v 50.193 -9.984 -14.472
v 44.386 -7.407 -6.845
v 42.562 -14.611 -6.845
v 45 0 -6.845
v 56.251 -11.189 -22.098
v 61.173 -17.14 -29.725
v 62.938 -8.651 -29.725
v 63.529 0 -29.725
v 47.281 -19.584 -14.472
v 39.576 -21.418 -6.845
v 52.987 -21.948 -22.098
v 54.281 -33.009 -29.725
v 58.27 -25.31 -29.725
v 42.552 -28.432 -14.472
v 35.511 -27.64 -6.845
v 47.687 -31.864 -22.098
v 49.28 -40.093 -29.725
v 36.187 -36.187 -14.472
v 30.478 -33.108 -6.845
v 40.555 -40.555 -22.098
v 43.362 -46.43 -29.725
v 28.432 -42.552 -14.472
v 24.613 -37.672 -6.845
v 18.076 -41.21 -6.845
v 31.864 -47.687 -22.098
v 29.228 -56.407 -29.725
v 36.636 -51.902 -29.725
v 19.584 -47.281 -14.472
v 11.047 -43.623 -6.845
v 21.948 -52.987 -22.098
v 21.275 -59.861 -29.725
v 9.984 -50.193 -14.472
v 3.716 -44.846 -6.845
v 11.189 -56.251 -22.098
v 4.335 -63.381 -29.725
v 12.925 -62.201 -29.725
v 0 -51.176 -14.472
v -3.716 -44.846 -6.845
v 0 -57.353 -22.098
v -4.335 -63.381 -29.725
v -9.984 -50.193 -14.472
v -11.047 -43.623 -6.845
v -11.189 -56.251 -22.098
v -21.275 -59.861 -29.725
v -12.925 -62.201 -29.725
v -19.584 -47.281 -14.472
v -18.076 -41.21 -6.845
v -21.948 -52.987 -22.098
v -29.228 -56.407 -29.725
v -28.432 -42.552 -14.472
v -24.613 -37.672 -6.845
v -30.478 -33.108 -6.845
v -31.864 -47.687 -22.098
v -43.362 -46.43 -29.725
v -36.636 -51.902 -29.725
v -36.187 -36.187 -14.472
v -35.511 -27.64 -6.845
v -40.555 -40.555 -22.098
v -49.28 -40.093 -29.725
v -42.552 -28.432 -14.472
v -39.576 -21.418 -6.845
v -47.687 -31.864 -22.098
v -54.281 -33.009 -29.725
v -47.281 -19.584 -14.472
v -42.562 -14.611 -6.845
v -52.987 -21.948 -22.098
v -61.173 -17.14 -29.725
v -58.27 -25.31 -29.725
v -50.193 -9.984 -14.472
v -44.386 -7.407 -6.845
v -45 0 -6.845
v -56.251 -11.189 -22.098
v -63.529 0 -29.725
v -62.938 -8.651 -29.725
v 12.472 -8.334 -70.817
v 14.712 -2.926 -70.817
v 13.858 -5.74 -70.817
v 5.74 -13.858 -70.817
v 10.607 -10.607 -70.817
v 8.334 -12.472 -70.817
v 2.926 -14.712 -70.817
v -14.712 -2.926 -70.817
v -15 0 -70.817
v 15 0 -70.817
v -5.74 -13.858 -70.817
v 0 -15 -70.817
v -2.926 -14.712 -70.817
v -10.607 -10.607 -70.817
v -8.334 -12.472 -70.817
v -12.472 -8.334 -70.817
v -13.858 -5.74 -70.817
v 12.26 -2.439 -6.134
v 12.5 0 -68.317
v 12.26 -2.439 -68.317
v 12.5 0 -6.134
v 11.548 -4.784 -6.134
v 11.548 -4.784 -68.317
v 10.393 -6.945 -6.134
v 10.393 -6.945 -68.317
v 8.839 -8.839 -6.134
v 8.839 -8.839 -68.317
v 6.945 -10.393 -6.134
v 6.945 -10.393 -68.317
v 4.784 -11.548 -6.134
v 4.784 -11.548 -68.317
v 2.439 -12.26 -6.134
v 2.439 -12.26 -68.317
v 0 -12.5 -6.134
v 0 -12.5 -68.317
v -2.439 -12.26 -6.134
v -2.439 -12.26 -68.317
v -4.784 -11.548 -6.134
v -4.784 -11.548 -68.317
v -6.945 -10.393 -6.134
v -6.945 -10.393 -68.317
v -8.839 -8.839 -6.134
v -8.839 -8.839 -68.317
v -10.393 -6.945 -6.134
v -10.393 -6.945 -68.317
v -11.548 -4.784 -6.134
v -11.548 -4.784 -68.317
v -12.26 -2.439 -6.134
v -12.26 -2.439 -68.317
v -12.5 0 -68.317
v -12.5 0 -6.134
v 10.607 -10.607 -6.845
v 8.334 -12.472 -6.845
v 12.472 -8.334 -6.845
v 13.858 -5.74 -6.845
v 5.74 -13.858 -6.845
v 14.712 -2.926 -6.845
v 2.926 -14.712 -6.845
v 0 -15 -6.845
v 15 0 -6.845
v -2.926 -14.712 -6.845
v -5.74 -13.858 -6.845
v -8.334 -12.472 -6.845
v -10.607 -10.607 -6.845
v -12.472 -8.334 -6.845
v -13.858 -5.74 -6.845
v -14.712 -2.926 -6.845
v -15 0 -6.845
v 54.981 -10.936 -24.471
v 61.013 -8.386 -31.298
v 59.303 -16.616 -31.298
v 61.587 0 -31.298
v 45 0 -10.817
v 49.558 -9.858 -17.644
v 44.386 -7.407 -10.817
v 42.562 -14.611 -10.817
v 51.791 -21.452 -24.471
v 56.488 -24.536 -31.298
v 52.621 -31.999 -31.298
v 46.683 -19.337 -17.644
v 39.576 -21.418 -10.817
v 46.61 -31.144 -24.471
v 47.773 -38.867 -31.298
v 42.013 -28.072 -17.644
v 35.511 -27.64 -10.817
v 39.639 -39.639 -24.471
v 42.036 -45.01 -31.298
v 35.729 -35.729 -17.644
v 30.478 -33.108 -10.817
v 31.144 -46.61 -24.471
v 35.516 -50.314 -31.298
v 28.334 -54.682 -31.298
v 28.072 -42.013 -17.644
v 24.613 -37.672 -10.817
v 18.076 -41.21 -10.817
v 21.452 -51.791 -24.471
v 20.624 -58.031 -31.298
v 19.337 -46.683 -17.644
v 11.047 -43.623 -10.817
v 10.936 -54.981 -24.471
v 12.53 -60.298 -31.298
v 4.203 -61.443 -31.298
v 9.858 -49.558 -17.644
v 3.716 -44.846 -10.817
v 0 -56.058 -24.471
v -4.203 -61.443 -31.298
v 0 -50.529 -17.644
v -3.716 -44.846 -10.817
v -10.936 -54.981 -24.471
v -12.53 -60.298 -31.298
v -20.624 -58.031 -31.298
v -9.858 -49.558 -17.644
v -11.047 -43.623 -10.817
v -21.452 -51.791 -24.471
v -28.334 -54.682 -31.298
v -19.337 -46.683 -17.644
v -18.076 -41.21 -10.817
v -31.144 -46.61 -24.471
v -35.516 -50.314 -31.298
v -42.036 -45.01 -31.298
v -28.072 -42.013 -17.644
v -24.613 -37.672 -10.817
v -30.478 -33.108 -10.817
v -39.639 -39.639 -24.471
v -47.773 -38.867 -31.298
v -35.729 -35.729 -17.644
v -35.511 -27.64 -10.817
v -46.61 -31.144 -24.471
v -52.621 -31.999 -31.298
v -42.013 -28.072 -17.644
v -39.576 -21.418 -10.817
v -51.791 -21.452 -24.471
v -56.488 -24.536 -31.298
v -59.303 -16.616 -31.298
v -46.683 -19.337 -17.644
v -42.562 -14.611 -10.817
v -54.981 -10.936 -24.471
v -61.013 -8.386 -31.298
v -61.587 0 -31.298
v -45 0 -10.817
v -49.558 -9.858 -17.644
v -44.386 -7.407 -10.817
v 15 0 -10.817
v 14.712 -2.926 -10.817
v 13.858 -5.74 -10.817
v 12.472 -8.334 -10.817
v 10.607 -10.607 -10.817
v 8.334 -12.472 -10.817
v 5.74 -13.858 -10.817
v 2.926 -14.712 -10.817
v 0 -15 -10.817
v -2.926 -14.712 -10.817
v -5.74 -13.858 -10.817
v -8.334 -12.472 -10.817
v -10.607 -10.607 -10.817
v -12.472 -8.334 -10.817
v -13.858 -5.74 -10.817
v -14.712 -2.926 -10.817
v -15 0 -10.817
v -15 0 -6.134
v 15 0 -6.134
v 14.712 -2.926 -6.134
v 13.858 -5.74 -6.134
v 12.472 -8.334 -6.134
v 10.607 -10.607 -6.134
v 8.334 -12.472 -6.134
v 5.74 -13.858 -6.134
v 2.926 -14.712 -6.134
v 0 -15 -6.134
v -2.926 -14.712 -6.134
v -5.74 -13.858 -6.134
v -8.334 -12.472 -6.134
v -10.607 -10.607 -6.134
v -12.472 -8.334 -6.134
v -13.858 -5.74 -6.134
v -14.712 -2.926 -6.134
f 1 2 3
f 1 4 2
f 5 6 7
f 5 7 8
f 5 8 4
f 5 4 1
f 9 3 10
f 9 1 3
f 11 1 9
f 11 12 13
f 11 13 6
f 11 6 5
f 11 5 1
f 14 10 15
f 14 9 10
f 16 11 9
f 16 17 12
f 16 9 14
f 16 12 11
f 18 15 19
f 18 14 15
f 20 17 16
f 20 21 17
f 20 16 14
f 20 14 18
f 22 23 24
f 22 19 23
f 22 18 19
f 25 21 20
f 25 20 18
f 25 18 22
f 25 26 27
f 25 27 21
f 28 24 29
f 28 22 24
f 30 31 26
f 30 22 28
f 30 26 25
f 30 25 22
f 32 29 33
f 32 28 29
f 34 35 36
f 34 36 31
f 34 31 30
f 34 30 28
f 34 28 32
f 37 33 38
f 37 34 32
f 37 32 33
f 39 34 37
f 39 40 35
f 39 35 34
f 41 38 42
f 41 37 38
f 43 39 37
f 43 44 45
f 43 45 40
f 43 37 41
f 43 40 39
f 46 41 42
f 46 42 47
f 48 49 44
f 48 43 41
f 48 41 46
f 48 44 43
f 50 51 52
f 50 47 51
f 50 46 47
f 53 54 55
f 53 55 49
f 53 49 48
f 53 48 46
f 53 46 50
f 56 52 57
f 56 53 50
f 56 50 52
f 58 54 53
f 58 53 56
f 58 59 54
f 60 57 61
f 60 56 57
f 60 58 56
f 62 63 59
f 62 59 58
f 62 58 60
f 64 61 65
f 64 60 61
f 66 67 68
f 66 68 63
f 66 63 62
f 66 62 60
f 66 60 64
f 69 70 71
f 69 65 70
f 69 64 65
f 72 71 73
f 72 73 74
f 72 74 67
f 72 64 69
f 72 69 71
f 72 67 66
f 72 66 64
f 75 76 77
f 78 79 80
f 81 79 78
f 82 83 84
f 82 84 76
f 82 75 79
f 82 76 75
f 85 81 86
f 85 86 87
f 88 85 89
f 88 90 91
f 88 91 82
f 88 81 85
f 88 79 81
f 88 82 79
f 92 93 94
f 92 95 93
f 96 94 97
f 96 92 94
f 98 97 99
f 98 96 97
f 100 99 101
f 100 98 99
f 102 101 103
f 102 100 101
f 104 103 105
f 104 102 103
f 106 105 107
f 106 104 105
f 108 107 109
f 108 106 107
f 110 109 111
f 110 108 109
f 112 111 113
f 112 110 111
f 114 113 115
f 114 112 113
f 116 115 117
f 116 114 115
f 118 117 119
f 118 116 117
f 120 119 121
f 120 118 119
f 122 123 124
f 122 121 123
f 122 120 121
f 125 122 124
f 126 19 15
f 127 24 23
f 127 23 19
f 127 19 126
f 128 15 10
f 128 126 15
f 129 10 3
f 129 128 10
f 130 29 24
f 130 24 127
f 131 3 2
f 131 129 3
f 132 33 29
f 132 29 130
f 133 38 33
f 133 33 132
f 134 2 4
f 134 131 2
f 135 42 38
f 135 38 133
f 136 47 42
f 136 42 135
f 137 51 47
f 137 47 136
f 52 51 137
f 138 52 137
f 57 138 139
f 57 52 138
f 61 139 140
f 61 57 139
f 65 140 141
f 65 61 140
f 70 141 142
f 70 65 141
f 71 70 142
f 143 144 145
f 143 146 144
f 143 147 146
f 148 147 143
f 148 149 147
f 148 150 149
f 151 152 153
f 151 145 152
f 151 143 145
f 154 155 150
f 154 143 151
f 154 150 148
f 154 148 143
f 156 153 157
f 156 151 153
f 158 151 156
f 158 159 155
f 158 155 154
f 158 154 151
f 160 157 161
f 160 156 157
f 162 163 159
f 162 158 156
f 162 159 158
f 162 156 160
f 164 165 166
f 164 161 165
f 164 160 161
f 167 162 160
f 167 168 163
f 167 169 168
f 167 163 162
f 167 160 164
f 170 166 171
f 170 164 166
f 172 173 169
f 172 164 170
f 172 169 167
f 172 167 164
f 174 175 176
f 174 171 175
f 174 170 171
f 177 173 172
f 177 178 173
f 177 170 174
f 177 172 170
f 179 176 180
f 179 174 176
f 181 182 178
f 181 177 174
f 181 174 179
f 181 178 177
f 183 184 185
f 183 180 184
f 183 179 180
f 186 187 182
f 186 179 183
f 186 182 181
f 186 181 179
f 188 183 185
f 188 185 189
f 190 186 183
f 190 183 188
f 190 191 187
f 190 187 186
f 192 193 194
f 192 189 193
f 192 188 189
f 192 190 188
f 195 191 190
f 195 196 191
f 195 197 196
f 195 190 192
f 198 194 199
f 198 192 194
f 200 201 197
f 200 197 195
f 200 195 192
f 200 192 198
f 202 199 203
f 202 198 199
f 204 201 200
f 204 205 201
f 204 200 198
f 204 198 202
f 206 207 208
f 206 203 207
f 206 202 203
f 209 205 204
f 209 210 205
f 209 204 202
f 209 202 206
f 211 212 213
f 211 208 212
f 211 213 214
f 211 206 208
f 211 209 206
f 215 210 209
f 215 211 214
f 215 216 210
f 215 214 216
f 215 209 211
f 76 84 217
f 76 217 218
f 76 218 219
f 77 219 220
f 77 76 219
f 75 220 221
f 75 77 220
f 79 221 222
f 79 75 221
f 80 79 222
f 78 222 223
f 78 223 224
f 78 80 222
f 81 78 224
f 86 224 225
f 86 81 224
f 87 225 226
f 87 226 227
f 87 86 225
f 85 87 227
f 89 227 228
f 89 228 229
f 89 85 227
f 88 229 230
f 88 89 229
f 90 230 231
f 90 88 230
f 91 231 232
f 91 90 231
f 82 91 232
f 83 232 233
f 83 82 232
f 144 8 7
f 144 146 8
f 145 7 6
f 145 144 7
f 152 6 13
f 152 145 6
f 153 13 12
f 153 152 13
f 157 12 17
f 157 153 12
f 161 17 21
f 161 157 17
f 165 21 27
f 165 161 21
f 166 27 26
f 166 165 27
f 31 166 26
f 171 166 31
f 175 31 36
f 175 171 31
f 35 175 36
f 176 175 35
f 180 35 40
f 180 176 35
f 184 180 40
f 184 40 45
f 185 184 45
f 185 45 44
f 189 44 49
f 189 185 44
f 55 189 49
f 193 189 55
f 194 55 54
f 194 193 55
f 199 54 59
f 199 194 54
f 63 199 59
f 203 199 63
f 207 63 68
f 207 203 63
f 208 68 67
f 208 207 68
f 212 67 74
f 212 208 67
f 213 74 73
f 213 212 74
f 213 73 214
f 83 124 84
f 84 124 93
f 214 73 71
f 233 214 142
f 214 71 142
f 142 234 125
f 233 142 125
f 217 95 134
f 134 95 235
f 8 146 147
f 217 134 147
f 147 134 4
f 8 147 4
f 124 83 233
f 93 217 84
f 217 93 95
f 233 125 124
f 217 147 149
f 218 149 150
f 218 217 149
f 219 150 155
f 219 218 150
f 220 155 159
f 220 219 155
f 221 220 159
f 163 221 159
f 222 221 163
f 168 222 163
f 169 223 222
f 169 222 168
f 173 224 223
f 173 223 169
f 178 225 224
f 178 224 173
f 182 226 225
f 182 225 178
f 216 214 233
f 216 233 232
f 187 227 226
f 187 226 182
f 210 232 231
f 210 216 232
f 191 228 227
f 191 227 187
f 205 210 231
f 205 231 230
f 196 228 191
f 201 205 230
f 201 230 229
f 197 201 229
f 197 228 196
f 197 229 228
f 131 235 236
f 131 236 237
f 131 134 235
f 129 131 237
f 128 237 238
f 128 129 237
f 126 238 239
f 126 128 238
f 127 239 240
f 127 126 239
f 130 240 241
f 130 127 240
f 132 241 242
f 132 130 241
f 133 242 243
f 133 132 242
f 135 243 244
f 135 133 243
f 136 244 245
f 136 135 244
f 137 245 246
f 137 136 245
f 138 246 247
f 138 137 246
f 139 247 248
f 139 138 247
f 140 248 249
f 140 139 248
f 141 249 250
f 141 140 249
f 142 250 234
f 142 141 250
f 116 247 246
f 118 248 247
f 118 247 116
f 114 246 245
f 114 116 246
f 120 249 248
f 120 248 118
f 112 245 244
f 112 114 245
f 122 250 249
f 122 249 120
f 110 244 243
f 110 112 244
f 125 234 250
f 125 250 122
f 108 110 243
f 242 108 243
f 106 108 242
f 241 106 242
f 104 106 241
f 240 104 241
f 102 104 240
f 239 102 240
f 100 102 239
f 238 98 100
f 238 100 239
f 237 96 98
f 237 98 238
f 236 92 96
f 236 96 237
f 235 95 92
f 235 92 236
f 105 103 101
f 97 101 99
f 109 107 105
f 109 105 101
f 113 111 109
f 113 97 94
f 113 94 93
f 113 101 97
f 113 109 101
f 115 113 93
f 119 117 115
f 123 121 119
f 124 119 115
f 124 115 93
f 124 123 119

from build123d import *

# Parameters (mm, degrees)
F1_ANGLE = 180
F2_W     = 30.71798
F2_H     = 26.843641
F3_DEPTH = 100


with BuildPart() as f1:
    # F0 (on Right) → F1 (revolve, symmetric)
    with BuildSketch(Plane.YZ) as f1_sk:
        Polygon((-15, -70.817309), (0, -70.817309), (0, -68.317309), (-12.5, -68.317309), (-12.500003, 20.655008), (-15.000003, 20.655008), (-15.000003, -6.844992), (-45.000003, -6.844992), (-63.529334, -29.72469), (-61.58654, -31.298079), (-45.000003, -10.817309), (-15, -10.817309), align=None)
    revolve(axis=Axis((0, 0, -69.567309), (0, 0, 1)), revolution_arc=F1_ANGLE / 2)
    revolve(f1_sk.sketch, axis=Axis((0, 0, -69.567309), (0, 0, -1)), revolution_arc=F1_ANGLE / 2)

    # F2 (on Front) → F3 (cut)
    with BuildSketch(Plane.XZ):
        with Locations((-0.268487, 7.287501)):
            Rectangle(F2_W, F2_H)
    extrude(amount=F3_DEPTH, mode=Mode.SUBTRACT)


solid = f1.part
